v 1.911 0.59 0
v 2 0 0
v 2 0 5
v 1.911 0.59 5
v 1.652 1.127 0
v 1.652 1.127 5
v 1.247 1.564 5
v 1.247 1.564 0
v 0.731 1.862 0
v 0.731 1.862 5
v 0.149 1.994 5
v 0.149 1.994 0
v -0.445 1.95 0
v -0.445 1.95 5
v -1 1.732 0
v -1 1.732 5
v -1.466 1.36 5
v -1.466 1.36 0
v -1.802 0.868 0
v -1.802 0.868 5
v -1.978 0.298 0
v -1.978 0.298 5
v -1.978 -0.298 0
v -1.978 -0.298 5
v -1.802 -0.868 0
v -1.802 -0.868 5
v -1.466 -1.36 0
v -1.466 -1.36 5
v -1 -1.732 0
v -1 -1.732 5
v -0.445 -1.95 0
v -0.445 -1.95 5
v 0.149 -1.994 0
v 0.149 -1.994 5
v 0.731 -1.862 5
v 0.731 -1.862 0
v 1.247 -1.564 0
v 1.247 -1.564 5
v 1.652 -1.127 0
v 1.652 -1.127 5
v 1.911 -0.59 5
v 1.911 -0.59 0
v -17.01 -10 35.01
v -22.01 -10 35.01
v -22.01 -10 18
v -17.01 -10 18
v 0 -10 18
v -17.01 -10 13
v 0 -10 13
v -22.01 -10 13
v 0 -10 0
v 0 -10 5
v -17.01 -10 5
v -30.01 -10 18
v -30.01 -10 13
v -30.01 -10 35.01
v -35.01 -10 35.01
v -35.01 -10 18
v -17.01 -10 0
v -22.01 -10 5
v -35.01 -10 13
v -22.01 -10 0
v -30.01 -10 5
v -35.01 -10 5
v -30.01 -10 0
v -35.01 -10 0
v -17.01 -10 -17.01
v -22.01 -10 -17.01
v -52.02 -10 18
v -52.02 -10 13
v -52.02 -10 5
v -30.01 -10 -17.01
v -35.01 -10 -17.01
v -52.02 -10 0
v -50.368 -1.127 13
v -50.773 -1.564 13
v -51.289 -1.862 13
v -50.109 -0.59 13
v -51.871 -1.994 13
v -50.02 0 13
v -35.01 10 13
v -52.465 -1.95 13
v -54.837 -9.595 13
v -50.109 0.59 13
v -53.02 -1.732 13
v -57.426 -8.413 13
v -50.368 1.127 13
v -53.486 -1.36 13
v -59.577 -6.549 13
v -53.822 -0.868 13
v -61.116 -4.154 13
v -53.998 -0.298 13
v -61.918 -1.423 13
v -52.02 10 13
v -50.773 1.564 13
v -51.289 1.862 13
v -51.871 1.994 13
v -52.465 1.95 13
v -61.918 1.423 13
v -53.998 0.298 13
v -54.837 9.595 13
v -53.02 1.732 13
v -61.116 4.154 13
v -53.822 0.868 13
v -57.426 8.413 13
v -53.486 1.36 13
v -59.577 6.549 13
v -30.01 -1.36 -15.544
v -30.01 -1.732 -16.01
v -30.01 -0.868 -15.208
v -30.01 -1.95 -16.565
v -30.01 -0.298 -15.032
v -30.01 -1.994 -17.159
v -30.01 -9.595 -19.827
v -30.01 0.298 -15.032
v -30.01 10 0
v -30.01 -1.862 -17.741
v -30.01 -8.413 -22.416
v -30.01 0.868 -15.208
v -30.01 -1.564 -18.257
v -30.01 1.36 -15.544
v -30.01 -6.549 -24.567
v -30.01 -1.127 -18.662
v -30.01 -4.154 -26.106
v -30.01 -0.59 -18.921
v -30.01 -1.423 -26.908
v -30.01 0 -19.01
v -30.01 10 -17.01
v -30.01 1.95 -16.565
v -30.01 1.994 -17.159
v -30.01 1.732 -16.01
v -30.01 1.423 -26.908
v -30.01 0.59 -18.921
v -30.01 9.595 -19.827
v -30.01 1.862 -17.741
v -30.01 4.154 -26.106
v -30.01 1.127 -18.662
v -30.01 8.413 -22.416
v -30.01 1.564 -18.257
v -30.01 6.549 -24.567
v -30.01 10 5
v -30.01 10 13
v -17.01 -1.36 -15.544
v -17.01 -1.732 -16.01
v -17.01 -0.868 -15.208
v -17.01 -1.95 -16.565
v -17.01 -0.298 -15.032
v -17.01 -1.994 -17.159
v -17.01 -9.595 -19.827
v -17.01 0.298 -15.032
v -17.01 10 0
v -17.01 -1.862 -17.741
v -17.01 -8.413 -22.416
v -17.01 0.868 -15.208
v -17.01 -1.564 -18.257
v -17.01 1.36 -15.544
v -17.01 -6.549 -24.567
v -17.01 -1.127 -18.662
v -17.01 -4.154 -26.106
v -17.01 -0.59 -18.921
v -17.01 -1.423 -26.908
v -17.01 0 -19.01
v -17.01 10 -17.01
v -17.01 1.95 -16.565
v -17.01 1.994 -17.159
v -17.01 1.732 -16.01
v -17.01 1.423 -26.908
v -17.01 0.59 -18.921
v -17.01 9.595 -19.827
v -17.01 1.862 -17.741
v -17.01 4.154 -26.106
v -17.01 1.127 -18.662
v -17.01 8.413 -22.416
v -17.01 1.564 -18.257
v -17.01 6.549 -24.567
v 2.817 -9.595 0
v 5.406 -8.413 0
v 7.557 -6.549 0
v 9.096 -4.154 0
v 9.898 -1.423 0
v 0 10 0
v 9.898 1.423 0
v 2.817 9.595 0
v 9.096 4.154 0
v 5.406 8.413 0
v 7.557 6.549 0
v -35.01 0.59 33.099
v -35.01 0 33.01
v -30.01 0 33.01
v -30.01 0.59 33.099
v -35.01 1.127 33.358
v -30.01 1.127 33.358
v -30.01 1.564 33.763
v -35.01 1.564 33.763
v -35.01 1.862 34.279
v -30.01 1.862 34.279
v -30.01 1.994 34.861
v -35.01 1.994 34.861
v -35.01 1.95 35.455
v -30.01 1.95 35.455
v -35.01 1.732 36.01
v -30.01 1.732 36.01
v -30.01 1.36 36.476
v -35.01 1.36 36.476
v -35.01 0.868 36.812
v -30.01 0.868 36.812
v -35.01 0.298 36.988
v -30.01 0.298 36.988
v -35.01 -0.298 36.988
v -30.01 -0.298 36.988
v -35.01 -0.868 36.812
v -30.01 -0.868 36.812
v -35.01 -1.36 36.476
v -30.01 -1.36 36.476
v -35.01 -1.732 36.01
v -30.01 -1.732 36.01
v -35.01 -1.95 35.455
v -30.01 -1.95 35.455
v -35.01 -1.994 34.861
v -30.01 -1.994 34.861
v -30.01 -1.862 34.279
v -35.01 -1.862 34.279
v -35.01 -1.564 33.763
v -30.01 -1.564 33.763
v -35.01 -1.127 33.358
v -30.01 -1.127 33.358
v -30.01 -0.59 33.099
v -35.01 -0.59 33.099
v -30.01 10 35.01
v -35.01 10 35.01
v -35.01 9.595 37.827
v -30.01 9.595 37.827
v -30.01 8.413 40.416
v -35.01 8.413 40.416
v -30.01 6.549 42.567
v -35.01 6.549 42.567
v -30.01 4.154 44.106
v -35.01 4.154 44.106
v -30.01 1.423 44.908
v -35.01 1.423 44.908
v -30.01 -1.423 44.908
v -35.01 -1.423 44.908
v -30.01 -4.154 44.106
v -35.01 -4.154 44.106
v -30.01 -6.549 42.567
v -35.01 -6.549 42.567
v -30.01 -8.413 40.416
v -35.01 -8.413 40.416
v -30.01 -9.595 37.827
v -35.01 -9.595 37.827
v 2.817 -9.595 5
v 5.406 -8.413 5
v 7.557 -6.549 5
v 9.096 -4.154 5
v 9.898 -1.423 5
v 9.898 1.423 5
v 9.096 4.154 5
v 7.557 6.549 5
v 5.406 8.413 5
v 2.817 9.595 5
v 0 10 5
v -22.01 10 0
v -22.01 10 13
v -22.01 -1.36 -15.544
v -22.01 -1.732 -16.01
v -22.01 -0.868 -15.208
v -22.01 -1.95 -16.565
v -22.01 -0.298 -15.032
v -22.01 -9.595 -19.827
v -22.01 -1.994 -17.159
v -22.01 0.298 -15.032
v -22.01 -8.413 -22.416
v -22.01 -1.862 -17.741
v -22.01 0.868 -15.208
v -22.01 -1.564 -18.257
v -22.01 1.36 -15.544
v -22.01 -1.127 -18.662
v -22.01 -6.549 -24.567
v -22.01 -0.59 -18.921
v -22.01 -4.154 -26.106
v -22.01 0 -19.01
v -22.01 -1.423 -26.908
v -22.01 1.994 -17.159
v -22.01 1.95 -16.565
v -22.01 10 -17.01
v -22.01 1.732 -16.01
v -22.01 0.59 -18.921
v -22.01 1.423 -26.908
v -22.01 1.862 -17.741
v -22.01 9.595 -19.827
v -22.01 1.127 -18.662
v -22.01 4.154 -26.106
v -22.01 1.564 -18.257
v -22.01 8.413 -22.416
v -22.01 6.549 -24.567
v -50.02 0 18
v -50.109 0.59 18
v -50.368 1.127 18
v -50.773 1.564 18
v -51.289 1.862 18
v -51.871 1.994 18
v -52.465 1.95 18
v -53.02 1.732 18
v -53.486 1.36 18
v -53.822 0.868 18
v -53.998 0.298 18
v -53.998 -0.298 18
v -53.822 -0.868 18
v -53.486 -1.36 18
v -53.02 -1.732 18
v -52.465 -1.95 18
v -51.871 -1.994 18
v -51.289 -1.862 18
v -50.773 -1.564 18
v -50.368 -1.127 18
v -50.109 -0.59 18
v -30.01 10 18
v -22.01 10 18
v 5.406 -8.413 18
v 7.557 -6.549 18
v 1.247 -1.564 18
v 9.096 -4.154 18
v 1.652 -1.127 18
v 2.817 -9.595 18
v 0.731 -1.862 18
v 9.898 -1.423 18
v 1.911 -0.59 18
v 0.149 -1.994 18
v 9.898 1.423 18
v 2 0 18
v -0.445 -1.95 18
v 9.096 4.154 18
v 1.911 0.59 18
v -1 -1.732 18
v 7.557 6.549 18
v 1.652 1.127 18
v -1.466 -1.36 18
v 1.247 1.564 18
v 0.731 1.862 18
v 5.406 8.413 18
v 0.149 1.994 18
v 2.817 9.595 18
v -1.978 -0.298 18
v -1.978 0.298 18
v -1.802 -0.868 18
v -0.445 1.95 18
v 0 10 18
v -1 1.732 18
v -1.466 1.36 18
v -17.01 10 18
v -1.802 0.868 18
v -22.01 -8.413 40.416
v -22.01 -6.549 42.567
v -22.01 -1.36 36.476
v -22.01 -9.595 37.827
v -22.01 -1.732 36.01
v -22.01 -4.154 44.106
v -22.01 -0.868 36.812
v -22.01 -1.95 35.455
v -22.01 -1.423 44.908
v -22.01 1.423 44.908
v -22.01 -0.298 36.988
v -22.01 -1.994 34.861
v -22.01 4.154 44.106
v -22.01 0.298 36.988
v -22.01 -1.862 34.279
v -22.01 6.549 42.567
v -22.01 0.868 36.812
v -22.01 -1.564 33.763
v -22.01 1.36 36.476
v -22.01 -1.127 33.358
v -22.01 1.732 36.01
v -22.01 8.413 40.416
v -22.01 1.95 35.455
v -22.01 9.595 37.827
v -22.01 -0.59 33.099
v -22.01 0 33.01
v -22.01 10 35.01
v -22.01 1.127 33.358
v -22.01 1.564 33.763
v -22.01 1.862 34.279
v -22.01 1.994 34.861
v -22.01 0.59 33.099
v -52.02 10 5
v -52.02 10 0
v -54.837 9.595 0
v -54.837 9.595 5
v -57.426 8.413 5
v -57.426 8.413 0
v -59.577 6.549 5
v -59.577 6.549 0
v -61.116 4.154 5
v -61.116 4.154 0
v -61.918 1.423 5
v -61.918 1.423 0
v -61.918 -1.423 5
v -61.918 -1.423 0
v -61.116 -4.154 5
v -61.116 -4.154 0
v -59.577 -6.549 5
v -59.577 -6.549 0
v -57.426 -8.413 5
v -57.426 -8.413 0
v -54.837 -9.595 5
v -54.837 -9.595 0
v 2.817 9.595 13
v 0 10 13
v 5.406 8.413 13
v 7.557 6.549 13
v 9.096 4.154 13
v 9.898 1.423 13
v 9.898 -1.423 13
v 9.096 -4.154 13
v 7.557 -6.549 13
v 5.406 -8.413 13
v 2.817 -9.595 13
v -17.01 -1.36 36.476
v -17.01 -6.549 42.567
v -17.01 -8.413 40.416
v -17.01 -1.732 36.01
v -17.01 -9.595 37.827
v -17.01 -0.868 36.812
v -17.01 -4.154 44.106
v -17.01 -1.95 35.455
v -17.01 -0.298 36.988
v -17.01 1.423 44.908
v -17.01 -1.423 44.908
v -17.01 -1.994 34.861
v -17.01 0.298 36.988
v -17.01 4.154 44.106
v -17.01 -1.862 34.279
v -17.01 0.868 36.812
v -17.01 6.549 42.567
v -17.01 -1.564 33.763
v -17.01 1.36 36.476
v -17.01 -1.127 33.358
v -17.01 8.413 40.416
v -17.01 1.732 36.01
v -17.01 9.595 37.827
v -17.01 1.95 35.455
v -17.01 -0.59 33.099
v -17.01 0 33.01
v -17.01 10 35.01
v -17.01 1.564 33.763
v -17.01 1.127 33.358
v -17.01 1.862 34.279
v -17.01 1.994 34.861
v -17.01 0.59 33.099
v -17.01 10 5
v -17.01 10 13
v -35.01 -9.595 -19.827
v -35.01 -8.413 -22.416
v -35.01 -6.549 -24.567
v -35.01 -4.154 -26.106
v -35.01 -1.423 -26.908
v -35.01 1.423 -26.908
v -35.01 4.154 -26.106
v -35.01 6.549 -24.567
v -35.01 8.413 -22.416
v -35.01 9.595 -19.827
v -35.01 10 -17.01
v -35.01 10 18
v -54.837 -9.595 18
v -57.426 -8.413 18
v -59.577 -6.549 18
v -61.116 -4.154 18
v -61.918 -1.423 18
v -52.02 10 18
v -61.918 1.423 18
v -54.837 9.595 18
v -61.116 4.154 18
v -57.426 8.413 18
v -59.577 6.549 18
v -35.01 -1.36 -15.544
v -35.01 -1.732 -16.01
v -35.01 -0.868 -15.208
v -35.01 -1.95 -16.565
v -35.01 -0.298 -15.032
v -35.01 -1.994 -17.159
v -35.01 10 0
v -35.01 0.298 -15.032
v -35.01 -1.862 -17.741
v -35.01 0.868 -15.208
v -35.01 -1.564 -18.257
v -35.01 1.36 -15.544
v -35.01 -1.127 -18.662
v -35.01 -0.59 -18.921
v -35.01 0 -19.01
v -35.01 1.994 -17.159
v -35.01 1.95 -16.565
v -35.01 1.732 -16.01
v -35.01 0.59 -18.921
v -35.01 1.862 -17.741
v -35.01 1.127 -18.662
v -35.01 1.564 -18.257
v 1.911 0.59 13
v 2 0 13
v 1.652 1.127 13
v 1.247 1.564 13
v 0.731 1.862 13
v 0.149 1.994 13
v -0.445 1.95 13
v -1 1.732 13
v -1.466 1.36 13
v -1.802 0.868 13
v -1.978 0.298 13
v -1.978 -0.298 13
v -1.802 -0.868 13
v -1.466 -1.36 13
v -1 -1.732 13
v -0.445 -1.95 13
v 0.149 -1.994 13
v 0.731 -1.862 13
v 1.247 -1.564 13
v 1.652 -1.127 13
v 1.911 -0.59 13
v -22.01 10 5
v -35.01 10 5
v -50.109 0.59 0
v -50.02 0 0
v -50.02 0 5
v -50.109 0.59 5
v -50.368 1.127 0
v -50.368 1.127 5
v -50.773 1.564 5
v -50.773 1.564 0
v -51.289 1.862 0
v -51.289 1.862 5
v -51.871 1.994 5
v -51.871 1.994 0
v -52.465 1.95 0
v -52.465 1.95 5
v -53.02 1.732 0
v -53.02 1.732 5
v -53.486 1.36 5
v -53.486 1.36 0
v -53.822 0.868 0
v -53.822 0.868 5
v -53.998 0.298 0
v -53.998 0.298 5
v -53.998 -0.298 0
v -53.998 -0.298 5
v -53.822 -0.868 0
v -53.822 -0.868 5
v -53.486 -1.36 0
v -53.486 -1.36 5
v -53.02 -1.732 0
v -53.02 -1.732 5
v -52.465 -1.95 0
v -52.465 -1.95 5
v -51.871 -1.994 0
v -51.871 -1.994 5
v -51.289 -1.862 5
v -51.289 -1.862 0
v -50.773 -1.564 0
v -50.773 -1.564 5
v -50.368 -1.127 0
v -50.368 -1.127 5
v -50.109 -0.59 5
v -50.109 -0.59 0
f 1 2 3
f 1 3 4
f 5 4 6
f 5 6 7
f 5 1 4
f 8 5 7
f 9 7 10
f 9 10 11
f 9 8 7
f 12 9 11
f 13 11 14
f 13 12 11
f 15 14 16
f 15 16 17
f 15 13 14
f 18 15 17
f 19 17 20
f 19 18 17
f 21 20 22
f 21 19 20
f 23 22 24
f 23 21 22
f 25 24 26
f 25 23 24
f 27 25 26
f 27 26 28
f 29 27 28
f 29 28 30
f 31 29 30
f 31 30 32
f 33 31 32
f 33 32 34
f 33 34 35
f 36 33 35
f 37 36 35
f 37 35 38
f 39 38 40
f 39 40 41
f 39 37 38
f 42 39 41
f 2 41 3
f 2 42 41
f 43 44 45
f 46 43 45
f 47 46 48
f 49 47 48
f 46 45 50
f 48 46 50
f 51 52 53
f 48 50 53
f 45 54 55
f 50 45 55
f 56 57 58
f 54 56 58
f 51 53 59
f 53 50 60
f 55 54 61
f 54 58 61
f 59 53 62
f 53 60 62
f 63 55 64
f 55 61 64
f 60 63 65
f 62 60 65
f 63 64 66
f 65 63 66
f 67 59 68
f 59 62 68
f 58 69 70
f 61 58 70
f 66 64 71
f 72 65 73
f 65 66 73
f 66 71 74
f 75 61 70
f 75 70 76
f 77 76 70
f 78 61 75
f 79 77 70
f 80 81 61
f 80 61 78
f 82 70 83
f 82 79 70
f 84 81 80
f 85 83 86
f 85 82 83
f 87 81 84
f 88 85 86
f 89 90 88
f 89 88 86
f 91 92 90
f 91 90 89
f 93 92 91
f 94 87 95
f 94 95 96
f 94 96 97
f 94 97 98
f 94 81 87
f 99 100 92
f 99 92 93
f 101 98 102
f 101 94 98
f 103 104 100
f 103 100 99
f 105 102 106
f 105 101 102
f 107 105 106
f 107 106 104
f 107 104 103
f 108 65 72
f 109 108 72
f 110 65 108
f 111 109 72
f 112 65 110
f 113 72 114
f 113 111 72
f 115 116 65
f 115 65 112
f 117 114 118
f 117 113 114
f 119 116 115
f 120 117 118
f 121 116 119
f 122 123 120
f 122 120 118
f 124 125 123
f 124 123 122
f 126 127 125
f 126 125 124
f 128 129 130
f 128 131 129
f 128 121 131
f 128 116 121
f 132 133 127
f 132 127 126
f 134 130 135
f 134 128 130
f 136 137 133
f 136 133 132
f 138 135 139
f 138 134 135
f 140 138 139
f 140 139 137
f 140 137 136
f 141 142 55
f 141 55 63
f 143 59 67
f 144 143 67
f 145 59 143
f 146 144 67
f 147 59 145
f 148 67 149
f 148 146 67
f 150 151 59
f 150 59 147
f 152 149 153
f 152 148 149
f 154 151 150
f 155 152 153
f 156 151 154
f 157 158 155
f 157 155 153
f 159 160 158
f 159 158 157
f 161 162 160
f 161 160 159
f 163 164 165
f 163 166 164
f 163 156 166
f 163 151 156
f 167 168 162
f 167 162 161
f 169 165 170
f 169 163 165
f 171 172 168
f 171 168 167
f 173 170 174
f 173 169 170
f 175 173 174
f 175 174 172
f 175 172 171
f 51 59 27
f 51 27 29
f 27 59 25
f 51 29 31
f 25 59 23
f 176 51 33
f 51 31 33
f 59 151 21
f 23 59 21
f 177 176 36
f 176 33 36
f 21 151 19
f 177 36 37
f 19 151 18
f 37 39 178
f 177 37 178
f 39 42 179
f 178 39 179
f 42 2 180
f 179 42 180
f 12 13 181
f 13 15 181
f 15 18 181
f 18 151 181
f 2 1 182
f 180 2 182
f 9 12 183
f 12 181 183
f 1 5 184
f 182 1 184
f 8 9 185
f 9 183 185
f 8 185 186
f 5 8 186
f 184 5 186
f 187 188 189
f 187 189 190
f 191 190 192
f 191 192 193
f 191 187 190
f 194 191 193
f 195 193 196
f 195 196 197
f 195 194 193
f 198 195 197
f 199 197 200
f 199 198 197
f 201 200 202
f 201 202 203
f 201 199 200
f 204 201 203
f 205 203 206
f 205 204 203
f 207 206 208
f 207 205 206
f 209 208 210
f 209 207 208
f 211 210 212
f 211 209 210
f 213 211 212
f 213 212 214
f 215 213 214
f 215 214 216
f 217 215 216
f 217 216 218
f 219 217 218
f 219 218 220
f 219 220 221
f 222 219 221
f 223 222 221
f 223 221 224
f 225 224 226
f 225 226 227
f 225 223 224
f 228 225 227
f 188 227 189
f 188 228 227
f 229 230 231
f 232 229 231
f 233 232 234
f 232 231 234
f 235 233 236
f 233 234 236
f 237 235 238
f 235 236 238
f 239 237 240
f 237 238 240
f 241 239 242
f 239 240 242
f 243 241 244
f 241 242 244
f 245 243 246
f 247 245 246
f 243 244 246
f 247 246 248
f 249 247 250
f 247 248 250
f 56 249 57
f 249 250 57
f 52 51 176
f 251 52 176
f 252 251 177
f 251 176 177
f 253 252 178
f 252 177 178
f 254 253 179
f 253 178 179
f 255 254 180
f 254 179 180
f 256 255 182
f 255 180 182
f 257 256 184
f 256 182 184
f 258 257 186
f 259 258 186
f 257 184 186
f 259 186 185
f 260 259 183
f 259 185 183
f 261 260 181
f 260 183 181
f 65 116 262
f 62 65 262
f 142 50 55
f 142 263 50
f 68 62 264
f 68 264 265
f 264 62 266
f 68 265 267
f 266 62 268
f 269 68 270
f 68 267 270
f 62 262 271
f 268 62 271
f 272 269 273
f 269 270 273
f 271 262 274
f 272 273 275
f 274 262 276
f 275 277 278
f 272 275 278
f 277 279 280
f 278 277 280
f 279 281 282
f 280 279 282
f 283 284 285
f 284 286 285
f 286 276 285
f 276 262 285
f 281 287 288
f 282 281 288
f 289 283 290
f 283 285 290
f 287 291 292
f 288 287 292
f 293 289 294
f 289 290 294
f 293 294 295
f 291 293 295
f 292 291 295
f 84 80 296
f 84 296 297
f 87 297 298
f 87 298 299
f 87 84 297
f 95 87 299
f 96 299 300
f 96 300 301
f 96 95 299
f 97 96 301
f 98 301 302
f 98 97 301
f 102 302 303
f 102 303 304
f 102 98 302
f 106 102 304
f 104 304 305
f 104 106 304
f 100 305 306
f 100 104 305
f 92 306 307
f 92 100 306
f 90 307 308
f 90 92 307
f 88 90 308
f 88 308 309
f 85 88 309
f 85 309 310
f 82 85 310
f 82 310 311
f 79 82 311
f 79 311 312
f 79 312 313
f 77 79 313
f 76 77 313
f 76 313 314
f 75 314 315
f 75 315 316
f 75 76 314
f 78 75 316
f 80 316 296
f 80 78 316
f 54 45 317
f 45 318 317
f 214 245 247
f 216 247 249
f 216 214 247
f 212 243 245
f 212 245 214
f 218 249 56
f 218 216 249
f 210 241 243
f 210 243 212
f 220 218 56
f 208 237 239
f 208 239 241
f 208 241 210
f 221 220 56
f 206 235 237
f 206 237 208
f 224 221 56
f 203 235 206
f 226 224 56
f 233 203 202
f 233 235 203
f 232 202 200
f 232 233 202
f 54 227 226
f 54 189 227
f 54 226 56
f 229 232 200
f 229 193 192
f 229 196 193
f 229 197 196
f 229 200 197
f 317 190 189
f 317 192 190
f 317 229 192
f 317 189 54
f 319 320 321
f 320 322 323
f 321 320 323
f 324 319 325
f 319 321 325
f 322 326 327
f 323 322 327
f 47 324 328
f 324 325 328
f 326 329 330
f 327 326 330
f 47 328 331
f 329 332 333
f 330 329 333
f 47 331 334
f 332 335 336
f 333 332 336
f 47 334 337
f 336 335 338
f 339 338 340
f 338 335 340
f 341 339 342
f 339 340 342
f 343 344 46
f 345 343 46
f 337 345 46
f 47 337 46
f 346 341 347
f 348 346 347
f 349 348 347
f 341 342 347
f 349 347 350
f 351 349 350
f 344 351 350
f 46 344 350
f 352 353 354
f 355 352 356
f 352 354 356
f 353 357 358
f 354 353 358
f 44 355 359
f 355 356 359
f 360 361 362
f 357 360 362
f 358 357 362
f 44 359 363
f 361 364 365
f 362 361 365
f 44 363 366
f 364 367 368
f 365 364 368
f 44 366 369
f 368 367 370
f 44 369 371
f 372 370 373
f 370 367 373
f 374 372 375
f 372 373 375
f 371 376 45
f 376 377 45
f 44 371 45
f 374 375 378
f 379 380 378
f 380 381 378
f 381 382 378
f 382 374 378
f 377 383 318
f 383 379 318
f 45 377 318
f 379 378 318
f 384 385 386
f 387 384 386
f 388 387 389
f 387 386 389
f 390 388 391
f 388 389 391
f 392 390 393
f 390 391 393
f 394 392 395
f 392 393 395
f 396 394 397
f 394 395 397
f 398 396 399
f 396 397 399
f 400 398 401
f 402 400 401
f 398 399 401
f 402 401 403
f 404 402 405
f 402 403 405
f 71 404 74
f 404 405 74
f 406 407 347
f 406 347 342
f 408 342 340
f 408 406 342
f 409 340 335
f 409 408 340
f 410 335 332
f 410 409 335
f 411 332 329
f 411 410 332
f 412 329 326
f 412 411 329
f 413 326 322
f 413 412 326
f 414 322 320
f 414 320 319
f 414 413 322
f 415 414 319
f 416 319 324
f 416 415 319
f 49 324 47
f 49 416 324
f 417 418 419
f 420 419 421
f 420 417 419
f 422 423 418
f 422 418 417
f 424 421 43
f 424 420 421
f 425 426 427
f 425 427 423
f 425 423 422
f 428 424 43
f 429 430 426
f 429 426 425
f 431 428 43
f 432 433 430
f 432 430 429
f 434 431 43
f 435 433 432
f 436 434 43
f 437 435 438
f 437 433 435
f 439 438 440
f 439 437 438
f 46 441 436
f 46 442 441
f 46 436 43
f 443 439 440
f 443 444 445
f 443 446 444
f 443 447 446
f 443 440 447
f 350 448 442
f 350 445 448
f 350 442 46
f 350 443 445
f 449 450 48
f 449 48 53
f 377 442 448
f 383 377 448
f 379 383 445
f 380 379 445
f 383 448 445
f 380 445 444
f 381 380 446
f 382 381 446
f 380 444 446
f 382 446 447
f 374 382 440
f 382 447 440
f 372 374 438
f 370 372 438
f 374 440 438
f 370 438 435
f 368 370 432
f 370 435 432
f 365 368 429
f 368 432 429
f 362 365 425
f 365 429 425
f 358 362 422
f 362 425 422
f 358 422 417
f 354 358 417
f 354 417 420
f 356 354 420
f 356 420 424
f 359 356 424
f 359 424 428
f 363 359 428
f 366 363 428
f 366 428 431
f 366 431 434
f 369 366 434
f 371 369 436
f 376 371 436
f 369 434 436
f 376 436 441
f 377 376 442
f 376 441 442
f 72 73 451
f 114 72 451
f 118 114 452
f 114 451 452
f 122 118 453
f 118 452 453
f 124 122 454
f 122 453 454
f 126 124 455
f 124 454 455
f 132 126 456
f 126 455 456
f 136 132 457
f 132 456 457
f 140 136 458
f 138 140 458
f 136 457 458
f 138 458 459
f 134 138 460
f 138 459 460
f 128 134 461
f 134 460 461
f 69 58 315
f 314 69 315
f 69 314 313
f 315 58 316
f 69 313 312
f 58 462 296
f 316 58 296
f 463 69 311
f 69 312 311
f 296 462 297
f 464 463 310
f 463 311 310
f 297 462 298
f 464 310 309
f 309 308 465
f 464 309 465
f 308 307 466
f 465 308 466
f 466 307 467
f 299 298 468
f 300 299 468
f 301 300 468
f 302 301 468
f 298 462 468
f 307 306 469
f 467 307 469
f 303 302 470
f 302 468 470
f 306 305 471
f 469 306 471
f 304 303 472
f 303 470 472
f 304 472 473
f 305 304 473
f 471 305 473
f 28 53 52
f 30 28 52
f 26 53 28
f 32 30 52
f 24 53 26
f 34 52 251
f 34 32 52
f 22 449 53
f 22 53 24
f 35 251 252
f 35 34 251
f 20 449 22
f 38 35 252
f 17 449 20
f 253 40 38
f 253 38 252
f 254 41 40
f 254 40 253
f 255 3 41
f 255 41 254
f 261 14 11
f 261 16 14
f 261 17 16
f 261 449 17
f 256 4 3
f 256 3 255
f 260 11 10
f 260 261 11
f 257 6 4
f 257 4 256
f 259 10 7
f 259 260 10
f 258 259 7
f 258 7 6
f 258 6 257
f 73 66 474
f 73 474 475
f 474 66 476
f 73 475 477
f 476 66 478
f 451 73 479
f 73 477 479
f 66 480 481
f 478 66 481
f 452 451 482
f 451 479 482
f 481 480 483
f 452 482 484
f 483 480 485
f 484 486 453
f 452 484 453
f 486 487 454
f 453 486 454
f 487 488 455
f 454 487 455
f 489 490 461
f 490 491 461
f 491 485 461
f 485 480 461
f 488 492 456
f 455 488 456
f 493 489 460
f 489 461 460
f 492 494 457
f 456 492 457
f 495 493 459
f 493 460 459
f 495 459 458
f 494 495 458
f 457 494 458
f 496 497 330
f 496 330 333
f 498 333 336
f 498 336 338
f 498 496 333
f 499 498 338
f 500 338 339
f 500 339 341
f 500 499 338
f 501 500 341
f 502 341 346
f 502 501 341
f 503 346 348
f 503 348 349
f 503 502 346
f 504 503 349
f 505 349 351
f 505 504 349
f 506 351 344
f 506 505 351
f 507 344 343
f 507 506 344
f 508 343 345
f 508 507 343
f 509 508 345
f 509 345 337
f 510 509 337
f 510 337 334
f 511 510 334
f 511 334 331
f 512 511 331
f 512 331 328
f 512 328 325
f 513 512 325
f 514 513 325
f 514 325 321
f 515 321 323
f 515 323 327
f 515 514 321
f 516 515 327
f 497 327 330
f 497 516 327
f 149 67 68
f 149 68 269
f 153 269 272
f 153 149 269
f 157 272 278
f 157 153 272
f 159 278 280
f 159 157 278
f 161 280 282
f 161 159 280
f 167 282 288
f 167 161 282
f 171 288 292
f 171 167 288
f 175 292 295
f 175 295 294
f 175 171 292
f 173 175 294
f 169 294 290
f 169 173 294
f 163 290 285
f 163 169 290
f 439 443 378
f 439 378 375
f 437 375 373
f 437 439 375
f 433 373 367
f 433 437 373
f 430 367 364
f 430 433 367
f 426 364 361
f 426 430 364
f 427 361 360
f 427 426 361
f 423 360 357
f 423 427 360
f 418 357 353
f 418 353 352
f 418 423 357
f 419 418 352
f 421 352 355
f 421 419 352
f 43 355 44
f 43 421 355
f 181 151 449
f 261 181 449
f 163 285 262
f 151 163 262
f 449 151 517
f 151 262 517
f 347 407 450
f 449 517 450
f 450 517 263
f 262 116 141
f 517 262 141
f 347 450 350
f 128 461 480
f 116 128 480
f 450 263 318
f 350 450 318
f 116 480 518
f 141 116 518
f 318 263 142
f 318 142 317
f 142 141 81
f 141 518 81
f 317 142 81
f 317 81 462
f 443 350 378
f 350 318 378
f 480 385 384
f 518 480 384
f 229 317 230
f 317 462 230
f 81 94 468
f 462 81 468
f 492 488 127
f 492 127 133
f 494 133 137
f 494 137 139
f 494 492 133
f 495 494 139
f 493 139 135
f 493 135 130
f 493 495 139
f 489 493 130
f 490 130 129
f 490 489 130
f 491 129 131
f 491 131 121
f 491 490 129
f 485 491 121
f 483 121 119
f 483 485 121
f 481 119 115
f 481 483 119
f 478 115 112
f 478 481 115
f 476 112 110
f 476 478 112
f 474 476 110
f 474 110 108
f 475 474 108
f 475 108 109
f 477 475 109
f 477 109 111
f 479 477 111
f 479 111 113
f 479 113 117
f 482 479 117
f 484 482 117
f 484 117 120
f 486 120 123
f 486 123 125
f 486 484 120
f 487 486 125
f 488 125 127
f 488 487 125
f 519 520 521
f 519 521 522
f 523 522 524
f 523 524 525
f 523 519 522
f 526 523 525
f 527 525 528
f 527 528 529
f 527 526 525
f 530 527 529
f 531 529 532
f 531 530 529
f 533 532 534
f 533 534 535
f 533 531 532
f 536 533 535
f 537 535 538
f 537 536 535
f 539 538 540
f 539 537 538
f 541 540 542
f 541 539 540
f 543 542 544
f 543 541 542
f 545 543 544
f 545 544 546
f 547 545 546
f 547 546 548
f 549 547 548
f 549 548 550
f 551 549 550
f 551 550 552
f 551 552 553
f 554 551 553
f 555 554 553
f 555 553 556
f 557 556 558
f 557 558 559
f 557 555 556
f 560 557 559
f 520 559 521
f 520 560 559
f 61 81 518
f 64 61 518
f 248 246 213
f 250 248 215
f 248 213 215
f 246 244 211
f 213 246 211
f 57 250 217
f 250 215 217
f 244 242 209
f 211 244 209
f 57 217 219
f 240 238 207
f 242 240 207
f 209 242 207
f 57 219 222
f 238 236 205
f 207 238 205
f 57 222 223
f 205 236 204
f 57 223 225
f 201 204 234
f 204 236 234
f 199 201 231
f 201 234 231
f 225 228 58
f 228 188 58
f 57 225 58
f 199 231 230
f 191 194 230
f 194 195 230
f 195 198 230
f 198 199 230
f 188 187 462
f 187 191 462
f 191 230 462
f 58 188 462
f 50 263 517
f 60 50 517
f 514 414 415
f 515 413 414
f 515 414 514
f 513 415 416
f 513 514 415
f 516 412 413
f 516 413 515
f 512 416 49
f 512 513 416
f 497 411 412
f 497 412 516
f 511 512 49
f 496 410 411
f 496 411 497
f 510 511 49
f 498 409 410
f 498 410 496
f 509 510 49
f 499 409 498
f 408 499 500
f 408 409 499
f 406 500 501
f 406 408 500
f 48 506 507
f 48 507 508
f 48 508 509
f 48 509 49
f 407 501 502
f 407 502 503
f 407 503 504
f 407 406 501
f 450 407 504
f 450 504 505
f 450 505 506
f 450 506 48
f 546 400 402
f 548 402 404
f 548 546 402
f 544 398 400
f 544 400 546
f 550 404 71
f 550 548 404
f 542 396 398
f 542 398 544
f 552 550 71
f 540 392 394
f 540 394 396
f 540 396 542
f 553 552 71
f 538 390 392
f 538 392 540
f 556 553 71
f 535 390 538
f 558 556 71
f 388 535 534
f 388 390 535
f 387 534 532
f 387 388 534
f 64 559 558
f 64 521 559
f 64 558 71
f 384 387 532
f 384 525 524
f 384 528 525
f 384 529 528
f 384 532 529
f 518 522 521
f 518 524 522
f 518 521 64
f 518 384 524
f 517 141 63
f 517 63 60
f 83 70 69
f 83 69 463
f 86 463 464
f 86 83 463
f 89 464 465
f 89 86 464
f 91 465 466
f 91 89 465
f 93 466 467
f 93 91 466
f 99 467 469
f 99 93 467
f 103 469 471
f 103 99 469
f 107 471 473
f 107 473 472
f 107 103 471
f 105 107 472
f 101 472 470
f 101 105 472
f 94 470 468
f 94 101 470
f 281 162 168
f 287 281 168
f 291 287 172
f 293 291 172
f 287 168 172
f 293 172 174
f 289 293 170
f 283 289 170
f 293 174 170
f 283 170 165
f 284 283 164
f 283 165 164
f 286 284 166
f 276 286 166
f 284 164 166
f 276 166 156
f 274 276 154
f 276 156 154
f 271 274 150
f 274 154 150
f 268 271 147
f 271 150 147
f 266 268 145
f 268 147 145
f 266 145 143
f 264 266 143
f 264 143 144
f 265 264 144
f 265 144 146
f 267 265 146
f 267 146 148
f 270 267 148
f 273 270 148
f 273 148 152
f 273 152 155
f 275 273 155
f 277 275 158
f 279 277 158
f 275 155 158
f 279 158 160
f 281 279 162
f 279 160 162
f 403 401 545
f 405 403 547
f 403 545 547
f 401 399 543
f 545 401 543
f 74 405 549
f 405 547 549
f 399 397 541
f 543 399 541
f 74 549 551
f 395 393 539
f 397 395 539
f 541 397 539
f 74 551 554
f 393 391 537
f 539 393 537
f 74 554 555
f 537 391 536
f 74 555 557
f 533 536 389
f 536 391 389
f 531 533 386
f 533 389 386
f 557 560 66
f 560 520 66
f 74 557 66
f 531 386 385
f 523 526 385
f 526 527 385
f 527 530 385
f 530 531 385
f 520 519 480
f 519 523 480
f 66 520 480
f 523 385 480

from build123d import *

# Parameters (mm, degrees)
CROQUIS1_R              = 2
SALIENTE_EXTRUIR1_DEPTH = 5
CROQUIS3_R              = 2
SALIENTE_EXTRUIR2_DEPTH = 5
CROQUIS5_R              = 2
SALIENTE_EXTRUIR3_DEPTH = 5
CROQUIS6_R              = 2
SALIENTE_EXTRUIR4_DEPTH = 5


with BuildPart() as part:
    # Croquis1 → Saliente-Extruir1 (new body)
    with BuildSketch(Plane.XY):
        with BuildLine():
            Line((-52.02, -10), (-26.01, -10))
            Line((-26.01, -10), (-26.01, 10))
            Line((-26.01, 10), (-52.02, 10))
            ThreePointArc((-52.02, 10), (-62.02, 0), (-52.02, -10))
        make_face()
        with Locations((-52.02, 0)):
            Circle(CROQUIS1_R, mode=Mode.SUBTRACT)
        with BuildLine():
            Line((-26.01, 10), (-26.01, -10))
            Line((-26.01, -10), (0, -10))
            ThreePointArc((0, -10), (10, 0), (0, 10))
            Line((0, 10), (-26.01, 10))
        make_face()
        Circle(CROQUIS1_R, mode=Mode.SUBTRACT)
    extrude(amount=SALIENTE_EXTRUIR1_DEPTH)



with BuildPart() as body_2:
    # Croquis3 → Saliente-Extruir2 (new body)
    with BuildSketch(Plane.XY.offset(13)):
        with BuildLine():
            Line((-52.02, 10), (0, 10))
            ThreePointArc((0, 10), (10, 0), (0, -10))
            Line((0, -10), (-52.02, -10))
            ThreePointArc((-52.02, -10), (-62.02, 0), (-52.02, 10))
        make_face()
        with Locations((-52.02, 0)):
            Circle(CROQUIS3_R, mode=Mode.SUBTRACT)
        Circle(CROQUIS3_R, mode=Mode.SUBTRACT)
    extrude(amount=SALIENTE_EXTRUIR2_DEPTH)


with BuildPart() as part_1:
    add(part.part)

    add(body_2.part)  # Saliente-Extruir3 merges body 2
    # Croquis5 → Saliente-Extruir3 (add)
    with BuildSketch(Plane(origin=(-17.01, 10, 0), x_dir=(0, 0, -1), z_dir=(1, 0, 0))):
        with BuildLine():
            Line((-35.01, -20), (17.01, -20))
            ThreePointArc((17.01, -20), (27.01, -10), (17.01, 0))
            Line((17.01, 0), (-35.01, 0))
            ThreePointArc((-35.01, 0), (-45.01, -10), (-35.01, -20))
        make_face()
        with Locations((17.01, -10)):
            Circle(CROQUIS5_R, mode=Mode.SUBTRACT)
        with Locations((-35.01, -10)):
            Circle(CROQUIS5_R, mode=Mode.SUBTRACT)
    extrude(amount=-SALIENTE_EXTRUIR3_DEPTH)

    # Croquis6 → Saliente-Extruir4 (add)
    with BuildSketch(Plane(origin=(-35.01, 10, 0), x_dir=(0, 0, -1), z_dir=(1, 0, 0))):
        with BuildLine():
            Line((17.01, 0), (-9, 0))
            Line((-9, 0), (-9, -20))
            Line((-9, -20), (17.01, -20))
            ThreePointArc((17.01, -20), (27.01, -10), (17.01, 0))
        make_face()
        with Locations((17.01, -10)):
            Circle(CROQUIS6_R, mode=Mode.SUBTRACT)
        with BuildLine():
            Line((-9, -20), (-9, 0))
            Line((-9, 0), (-35.01, 0))
            ThreePointArc((-35.01, 0), (-45.01, -10), (-35.01, -20))
            Line((-35.01, -20), (-9, -20))
        make_face()
        with Locations((-35.01, -10)):
            Circle(CROQUIS6_R, mode=Mode.SUBTRACT)
    extrude(amount=SALIENTE_EXTRUIR4_DEPTH)


solid = part_1.part
